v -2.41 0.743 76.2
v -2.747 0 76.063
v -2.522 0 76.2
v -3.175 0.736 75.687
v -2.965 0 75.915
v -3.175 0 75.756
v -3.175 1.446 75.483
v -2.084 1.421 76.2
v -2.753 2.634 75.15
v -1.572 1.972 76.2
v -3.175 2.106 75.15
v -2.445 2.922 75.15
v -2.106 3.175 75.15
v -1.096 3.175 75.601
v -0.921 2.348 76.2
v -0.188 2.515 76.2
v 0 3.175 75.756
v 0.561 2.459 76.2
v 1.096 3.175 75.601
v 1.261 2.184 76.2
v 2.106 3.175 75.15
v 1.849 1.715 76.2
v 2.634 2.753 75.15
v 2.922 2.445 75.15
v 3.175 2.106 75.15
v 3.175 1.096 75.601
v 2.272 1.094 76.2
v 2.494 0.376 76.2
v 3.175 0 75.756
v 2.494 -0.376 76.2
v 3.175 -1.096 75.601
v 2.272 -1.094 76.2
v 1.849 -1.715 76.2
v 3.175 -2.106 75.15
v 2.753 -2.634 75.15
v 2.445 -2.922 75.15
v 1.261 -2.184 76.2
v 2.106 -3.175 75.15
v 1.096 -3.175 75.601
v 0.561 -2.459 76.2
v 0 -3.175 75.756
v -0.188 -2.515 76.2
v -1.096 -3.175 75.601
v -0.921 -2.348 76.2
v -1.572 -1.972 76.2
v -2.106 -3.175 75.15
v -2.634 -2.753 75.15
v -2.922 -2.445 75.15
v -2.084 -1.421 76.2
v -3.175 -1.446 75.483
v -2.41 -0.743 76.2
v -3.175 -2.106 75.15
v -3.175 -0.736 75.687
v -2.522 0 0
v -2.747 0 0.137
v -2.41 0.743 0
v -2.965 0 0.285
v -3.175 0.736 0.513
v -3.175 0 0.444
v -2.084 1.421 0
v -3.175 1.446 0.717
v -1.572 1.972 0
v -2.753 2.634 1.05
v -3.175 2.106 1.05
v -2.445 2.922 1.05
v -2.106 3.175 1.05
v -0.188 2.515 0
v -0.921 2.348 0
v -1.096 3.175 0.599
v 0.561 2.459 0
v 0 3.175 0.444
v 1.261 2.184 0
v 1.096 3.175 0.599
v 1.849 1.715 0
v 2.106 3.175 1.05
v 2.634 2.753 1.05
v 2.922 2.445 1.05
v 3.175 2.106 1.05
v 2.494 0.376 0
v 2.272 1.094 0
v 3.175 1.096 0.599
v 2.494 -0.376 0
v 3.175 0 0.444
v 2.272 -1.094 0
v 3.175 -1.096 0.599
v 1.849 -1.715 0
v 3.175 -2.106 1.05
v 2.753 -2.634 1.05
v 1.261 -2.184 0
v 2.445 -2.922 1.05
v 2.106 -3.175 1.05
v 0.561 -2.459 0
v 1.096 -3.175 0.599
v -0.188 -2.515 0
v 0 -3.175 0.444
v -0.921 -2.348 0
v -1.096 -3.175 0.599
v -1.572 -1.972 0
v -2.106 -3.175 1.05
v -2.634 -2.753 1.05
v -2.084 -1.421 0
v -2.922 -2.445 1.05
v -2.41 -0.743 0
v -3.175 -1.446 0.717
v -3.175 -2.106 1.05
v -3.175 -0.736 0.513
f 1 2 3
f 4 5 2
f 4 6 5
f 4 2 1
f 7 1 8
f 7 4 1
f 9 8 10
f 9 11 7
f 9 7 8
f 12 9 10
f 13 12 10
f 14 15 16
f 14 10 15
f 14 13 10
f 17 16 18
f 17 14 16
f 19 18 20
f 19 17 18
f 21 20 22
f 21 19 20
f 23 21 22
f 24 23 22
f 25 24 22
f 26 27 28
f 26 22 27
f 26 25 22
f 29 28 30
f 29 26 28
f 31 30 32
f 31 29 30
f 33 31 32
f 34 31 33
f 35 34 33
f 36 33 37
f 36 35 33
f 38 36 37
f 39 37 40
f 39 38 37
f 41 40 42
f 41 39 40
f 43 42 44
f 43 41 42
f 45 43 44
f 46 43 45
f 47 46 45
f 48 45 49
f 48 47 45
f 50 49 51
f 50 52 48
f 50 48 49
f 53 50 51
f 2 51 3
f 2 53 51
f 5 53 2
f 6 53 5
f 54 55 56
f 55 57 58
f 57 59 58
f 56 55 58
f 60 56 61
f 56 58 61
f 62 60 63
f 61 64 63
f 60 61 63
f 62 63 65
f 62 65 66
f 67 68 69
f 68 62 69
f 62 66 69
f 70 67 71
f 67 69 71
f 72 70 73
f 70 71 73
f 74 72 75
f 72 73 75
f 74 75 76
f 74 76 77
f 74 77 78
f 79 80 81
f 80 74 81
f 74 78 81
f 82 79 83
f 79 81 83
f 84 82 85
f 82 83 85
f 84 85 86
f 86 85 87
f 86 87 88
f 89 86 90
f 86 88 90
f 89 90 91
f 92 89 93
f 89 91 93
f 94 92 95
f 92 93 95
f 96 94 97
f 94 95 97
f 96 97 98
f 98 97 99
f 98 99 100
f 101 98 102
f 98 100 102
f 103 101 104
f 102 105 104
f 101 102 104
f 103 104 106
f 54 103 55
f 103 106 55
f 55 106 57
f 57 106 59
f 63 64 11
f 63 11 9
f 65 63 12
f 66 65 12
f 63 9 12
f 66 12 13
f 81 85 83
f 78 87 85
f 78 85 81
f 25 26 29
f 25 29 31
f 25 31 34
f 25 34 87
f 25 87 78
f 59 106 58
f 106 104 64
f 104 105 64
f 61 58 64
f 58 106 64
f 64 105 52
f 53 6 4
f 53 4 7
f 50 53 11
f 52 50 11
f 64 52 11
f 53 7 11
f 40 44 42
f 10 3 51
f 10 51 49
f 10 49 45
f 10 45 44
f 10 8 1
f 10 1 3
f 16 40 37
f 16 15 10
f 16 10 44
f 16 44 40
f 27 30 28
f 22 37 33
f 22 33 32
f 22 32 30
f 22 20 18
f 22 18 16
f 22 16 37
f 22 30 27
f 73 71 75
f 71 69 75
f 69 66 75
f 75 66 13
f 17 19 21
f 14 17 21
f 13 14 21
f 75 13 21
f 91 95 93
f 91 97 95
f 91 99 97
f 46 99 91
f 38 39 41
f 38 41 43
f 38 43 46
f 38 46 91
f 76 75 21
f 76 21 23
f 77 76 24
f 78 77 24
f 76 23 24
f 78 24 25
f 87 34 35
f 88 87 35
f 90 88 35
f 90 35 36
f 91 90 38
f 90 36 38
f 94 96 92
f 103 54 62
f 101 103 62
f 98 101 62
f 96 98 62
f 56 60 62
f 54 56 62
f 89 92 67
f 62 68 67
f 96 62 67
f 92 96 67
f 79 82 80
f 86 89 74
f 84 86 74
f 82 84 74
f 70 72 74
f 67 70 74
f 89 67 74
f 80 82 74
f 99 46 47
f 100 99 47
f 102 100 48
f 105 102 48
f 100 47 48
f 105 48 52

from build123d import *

# Parameters (mm, degrees)
SKETCH1_W           = 6.35
SKETCH1_H           = 6.35
BOSS_EXTRUDE1_DEPTH = 38.1
SKETCH2_OUTSIDE_W   = 16.178
SKETCH2_OUTSIDE_H   = 16.178
SKETCH2_OUTSIDE_R   = 3.81
CUT_EXTRUDE1_DEPTH  = 39.1


with BuildPart() as part:
    # Sketch1 → Boss-Extrude1 (new body)
    with BuildSketch(Plane.XY):
        Rectangle(SKETCH1_W, SKETCH1_H)
    extrude(amount=BOSS_EXTRUDE1_DEPTH)

    # Sketch2 outside → Cut-Extrude1 (cut, through all)
    with BuildSketch(Plane(origin=(0, 0, 0), x_dir=(-1, 0, 0), z_dir=(0, 0, -1))):
        Rectangle(SKETCH2_OUTSIDE_W, SKETCH2_OUTSIDE_H)
        Circle(SKETCH2_OUTSIDE_R, mode=Mode.SUBTRACT)
    extrude(amount=-CUT_EXTRUDE1_DEPTH, mode=Mode.SUBTRACT)

    # Sketch3 → Cut-Revolve1 (revolve, cut)
    with BuildSketch(Plane(origin=(0, 0, 0), x_dir=(1, 0, 0), z_dir=(0, 1, 0))):
        with BuildLine():
            Line((-5.053685963, -3.893335876), (-5.053685963, 5.740530545))
            Line((-5.053685963, 5.740530545), (0, 5.740530545))
            Line((0, 5.740530545), (0, 0.670274551))
            ThreePointArc((0, 0.670274551), (-3.404639553, -0.639469554), (-5.053685963, -3.893335876))
        make_face()
    revolve(axis=Axis((0, 0, 38.1), (0, 0, -1)), mode=Mode.SUBTRACT)

    # Mirror1: part across plane


with BuildPart() as part_1:
    add(part.part)
    add(part.part.mirror(Plane(origin=(0, 0, 38.1), x_dir=(1, 0, 0), z_dir=(0, 0, -1))))


solid = part_1.part
